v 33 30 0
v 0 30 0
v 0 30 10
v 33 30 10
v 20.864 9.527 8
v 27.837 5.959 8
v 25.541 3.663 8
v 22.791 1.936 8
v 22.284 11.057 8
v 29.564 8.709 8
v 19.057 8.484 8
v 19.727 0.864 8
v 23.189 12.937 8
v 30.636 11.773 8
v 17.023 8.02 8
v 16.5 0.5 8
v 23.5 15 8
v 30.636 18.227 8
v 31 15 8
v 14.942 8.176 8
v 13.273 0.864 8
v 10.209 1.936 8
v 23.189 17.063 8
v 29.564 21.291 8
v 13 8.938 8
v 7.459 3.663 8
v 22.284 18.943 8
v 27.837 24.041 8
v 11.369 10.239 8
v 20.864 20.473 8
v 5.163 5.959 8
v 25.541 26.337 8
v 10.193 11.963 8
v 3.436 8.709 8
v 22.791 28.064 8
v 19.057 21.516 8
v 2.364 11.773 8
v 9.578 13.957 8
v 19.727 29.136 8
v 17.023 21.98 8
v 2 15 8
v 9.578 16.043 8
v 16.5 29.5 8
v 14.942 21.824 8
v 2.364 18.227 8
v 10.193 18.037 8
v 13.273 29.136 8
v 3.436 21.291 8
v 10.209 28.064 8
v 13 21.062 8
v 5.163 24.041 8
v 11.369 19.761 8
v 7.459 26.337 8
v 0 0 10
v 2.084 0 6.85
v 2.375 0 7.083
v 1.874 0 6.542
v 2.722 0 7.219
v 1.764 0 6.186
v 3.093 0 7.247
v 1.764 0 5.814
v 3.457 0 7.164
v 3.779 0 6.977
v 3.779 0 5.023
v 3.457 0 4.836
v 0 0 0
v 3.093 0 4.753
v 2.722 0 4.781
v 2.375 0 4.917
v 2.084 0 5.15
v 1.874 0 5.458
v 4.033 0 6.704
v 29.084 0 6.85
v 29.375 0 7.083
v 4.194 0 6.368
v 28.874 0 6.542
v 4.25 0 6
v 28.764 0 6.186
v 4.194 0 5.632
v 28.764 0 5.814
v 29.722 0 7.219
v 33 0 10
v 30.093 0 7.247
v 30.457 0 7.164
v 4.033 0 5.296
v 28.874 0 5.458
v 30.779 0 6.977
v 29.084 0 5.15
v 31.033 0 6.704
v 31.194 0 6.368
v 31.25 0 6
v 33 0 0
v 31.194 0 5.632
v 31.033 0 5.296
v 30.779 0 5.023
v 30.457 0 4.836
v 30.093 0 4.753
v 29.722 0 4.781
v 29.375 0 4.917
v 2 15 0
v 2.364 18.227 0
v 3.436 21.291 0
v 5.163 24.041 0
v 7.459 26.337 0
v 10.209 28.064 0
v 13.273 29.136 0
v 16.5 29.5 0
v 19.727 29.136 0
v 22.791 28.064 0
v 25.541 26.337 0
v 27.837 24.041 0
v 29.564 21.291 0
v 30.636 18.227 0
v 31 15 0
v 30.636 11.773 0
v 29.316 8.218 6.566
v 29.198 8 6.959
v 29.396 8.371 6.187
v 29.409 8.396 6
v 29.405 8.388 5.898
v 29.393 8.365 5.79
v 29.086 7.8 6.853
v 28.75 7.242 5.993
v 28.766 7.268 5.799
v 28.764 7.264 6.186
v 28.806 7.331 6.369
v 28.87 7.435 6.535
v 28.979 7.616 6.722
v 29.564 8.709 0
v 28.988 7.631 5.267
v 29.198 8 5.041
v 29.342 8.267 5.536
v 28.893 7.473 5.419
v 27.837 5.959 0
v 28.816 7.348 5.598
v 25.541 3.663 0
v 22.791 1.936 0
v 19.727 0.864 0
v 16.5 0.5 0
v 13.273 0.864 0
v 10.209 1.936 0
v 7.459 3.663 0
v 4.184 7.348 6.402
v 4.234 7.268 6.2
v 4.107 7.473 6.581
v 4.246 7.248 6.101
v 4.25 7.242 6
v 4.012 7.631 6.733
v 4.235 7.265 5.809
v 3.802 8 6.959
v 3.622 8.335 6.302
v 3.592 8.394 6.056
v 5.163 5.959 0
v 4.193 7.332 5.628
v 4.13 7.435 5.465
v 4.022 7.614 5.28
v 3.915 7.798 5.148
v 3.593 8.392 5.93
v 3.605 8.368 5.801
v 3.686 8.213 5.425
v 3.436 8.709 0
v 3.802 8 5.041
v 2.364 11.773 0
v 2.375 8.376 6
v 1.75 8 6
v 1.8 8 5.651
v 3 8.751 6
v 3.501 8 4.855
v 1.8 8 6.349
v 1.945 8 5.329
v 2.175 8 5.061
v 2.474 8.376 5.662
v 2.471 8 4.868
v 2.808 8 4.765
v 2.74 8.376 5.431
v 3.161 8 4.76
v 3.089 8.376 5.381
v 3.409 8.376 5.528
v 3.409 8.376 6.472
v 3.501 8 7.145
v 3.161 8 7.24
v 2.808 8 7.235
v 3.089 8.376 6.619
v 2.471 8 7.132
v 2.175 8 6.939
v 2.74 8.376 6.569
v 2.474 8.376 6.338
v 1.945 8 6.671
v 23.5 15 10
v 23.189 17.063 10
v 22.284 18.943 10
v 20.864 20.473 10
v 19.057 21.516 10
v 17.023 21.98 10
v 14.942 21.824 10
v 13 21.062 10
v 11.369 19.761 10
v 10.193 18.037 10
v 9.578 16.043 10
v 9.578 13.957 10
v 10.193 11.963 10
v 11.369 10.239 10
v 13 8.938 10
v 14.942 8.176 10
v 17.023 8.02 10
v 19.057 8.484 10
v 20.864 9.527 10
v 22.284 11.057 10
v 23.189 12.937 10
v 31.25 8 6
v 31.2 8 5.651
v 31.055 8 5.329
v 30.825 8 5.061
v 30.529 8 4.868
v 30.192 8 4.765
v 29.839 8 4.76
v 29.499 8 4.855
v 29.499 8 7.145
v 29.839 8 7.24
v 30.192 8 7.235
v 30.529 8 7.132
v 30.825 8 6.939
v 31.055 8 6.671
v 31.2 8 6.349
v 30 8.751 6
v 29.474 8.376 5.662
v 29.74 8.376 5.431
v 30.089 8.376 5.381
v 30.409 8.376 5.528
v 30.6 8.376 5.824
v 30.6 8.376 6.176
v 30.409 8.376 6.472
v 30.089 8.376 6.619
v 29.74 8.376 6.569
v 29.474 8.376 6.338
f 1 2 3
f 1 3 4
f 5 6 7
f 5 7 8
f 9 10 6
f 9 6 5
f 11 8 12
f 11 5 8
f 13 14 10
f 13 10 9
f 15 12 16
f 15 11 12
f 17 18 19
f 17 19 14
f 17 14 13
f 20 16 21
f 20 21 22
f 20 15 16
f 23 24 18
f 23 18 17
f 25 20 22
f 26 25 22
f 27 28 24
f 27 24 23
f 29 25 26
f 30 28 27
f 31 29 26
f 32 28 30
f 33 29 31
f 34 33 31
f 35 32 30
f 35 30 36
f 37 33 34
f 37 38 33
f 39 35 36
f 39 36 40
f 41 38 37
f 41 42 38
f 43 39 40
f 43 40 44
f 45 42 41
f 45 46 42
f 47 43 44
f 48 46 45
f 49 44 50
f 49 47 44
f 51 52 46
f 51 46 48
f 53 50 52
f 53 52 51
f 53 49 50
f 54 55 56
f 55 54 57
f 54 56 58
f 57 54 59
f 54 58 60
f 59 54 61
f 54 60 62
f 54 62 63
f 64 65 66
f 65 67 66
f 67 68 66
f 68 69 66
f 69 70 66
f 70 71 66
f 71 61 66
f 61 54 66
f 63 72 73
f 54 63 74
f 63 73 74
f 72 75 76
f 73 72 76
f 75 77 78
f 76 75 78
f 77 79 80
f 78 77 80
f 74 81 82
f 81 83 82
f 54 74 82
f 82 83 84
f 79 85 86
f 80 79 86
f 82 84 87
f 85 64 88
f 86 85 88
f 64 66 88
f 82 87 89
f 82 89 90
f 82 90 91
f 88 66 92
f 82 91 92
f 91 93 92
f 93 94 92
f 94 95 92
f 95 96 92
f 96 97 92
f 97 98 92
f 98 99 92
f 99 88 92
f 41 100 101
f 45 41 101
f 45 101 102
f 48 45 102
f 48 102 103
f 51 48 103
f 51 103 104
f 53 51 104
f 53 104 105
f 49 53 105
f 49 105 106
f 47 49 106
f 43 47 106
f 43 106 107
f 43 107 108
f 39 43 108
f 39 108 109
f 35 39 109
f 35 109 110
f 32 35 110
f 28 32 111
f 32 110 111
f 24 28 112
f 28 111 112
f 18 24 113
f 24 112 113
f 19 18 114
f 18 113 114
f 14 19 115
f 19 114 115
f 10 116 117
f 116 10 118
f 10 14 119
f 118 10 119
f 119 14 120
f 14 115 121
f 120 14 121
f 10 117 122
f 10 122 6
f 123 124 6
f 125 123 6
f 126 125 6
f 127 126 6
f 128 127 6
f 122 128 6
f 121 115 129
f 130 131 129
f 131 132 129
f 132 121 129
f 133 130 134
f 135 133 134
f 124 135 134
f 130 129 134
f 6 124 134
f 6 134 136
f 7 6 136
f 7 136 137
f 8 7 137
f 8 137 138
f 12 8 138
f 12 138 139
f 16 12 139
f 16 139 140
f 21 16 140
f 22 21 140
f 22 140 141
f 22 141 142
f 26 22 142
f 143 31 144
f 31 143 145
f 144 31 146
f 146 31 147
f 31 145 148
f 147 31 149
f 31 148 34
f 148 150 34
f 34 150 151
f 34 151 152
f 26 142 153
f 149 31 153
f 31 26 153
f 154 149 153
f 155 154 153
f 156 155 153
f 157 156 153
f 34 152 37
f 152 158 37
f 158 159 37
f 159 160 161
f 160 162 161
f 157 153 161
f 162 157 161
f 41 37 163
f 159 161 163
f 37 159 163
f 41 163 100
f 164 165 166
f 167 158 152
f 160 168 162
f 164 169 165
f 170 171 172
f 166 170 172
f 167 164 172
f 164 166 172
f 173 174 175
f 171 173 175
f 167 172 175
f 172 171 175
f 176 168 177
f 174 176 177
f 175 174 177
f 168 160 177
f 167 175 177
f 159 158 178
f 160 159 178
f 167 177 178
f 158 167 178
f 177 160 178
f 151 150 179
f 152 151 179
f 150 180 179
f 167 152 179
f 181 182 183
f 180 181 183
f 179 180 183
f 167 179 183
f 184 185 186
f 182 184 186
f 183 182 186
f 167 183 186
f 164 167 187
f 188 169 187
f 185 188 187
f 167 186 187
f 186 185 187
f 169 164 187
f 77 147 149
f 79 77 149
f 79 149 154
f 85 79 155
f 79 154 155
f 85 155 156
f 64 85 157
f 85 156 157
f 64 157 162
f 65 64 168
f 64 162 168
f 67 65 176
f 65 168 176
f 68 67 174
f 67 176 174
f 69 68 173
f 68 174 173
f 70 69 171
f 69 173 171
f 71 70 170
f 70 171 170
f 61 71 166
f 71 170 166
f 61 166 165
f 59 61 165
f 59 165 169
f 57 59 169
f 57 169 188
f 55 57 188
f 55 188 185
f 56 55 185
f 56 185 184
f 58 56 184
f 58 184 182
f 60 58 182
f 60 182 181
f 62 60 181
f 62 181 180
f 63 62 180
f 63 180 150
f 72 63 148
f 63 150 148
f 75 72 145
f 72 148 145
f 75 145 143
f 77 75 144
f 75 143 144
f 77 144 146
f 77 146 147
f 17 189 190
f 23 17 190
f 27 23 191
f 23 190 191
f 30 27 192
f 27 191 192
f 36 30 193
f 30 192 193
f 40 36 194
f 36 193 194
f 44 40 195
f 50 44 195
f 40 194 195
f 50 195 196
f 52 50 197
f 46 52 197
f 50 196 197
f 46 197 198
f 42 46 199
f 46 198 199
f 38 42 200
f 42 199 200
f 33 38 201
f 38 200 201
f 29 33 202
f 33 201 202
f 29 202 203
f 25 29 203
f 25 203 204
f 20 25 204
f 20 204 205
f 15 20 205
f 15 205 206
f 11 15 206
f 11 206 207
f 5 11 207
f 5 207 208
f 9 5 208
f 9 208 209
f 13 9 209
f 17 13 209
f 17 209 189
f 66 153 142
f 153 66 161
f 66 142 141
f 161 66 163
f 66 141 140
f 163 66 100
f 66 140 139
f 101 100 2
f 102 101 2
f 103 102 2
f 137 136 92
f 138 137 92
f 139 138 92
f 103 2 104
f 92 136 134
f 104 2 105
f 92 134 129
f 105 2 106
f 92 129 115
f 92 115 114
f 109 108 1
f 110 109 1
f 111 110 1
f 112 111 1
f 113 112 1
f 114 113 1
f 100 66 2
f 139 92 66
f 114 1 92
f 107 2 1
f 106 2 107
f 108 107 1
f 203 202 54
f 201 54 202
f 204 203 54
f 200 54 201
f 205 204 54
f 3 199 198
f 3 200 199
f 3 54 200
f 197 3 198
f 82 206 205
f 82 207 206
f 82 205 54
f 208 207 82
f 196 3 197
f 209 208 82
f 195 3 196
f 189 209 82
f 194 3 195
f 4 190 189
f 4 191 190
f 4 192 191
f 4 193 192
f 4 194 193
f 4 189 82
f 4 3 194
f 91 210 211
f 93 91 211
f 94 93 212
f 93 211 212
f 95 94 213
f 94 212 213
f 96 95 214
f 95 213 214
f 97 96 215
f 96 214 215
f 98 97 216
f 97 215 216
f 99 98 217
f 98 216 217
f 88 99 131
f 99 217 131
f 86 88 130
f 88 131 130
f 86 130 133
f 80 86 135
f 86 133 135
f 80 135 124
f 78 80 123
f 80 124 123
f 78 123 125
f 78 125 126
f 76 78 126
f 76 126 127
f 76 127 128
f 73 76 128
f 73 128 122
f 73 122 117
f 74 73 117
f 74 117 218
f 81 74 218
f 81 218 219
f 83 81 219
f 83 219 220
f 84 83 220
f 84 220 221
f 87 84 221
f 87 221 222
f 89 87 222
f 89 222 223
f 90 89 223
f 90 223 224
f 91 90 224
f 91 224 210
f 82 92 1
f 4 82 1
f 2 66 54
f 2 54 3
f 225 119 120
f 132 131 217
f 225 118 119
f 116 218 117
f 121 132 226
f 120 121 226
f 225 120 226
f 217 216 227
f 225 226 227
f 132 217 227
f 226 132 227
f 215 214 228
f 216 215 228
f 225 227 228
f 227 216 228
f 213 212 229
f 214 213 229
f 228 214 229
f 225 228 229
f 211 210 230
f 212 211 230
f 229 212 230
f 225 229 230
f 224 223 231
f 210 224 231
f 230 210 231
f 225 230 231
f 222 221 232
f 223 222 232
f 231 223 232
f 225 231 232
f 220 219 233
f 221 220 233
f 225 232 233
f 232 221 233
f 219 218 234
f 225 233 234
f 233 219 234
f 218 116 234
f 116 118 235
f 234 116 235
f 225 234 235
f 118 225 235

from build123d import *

# Parameters (mm, degrees)
SKETCH1_W                   = 33
SKETCH1_H                   = 30
BOSS_EXTRUDE1_DEPTH         = 10
CUT_EXTRUDE1_REACH          = 12
SKETCH2_R                   = 7
SKETCH3_R                   = 14.5
CUT_EXTRUDE2_DEPTH          = 8
TAP_DRILL_FOR_M3_TAP2_D     = 2.5
TAP_DRILL_FOR_M3_TAP2_DEPTH = 8
TAP_DRILL_FOR_M3_TAP2_TIP   = 0.751075774


with BuildPart() as part:
    # Sketch1 → Boss-Extrude1 (new body)
    with BuildSketch(Plane.XY):
        with Locations((16.5, 15)):
            Rectangle(SKETCH1_W, SKETCH1_H)
    extrude(amount=BOSS_EXTRUDE1_DEPTH)

    # Sketch2 → Cut-Extrude1 (cut, up to next)
    with BuildSketch(Plane.XY.offset(10), mode=Mode.PRIVATE) as cut_extrude1_sk1:
        with Locations((16.5, 15)):
            Circle(SKETCH2_R)
    cut_extrude1_tool1 = extrude(cut_extrude1_sk1.sketch, amount=-CUT_EXTRUDE1_REACH, mode=Mode.PRIVATE) & part.part
    add(cut_extrude1_tool1.solids().sort_by_distance((16.5, 15, 10))[0], mode=Mode.SUBTRACT)

    # Sketch3 → Cut-Extrude2 (cut)
    with BuildSketch(Plane(origin=(0, 0, 0), x_dir=(-1, 0, 0), z_dir=(0, 0, -1))):
        with Locations((-16.5, 15)):
            Circle(SKETCH3_R)
    extrude(amount=-CUT_EXTRUDE2_DEPTH, mode=Mode.SUBTRACT)

    # Tap Drill for M3 Tap2
    with Locations(Plane(origin=(0, 0, 0), x_dir=(-1, 0, 0), z_dir=(0, -1, 0))):
        with Locations((-3, -6), (-30, -6)):
            Hole(TAP_DRILL_FOR_M3_TAP2_D / 2, depth=TAP_DRILL_FOR_M3_TAP2_DEPTH)
            with Locations((0, 0, -(TAP_DRILL_FOR_M3_TAP2_DEPTH + TAP_DRILL_FOR_M3_TAP2_TIP / 2))):  # 118° drill point
                Cone(0, TAP_DRILL_FOR_M3_TAP2_D / 2, TAP_DRILL_FOR_M3_TAP2_TIP, mode=Mode.SUBTRACT)


solid = part.part
